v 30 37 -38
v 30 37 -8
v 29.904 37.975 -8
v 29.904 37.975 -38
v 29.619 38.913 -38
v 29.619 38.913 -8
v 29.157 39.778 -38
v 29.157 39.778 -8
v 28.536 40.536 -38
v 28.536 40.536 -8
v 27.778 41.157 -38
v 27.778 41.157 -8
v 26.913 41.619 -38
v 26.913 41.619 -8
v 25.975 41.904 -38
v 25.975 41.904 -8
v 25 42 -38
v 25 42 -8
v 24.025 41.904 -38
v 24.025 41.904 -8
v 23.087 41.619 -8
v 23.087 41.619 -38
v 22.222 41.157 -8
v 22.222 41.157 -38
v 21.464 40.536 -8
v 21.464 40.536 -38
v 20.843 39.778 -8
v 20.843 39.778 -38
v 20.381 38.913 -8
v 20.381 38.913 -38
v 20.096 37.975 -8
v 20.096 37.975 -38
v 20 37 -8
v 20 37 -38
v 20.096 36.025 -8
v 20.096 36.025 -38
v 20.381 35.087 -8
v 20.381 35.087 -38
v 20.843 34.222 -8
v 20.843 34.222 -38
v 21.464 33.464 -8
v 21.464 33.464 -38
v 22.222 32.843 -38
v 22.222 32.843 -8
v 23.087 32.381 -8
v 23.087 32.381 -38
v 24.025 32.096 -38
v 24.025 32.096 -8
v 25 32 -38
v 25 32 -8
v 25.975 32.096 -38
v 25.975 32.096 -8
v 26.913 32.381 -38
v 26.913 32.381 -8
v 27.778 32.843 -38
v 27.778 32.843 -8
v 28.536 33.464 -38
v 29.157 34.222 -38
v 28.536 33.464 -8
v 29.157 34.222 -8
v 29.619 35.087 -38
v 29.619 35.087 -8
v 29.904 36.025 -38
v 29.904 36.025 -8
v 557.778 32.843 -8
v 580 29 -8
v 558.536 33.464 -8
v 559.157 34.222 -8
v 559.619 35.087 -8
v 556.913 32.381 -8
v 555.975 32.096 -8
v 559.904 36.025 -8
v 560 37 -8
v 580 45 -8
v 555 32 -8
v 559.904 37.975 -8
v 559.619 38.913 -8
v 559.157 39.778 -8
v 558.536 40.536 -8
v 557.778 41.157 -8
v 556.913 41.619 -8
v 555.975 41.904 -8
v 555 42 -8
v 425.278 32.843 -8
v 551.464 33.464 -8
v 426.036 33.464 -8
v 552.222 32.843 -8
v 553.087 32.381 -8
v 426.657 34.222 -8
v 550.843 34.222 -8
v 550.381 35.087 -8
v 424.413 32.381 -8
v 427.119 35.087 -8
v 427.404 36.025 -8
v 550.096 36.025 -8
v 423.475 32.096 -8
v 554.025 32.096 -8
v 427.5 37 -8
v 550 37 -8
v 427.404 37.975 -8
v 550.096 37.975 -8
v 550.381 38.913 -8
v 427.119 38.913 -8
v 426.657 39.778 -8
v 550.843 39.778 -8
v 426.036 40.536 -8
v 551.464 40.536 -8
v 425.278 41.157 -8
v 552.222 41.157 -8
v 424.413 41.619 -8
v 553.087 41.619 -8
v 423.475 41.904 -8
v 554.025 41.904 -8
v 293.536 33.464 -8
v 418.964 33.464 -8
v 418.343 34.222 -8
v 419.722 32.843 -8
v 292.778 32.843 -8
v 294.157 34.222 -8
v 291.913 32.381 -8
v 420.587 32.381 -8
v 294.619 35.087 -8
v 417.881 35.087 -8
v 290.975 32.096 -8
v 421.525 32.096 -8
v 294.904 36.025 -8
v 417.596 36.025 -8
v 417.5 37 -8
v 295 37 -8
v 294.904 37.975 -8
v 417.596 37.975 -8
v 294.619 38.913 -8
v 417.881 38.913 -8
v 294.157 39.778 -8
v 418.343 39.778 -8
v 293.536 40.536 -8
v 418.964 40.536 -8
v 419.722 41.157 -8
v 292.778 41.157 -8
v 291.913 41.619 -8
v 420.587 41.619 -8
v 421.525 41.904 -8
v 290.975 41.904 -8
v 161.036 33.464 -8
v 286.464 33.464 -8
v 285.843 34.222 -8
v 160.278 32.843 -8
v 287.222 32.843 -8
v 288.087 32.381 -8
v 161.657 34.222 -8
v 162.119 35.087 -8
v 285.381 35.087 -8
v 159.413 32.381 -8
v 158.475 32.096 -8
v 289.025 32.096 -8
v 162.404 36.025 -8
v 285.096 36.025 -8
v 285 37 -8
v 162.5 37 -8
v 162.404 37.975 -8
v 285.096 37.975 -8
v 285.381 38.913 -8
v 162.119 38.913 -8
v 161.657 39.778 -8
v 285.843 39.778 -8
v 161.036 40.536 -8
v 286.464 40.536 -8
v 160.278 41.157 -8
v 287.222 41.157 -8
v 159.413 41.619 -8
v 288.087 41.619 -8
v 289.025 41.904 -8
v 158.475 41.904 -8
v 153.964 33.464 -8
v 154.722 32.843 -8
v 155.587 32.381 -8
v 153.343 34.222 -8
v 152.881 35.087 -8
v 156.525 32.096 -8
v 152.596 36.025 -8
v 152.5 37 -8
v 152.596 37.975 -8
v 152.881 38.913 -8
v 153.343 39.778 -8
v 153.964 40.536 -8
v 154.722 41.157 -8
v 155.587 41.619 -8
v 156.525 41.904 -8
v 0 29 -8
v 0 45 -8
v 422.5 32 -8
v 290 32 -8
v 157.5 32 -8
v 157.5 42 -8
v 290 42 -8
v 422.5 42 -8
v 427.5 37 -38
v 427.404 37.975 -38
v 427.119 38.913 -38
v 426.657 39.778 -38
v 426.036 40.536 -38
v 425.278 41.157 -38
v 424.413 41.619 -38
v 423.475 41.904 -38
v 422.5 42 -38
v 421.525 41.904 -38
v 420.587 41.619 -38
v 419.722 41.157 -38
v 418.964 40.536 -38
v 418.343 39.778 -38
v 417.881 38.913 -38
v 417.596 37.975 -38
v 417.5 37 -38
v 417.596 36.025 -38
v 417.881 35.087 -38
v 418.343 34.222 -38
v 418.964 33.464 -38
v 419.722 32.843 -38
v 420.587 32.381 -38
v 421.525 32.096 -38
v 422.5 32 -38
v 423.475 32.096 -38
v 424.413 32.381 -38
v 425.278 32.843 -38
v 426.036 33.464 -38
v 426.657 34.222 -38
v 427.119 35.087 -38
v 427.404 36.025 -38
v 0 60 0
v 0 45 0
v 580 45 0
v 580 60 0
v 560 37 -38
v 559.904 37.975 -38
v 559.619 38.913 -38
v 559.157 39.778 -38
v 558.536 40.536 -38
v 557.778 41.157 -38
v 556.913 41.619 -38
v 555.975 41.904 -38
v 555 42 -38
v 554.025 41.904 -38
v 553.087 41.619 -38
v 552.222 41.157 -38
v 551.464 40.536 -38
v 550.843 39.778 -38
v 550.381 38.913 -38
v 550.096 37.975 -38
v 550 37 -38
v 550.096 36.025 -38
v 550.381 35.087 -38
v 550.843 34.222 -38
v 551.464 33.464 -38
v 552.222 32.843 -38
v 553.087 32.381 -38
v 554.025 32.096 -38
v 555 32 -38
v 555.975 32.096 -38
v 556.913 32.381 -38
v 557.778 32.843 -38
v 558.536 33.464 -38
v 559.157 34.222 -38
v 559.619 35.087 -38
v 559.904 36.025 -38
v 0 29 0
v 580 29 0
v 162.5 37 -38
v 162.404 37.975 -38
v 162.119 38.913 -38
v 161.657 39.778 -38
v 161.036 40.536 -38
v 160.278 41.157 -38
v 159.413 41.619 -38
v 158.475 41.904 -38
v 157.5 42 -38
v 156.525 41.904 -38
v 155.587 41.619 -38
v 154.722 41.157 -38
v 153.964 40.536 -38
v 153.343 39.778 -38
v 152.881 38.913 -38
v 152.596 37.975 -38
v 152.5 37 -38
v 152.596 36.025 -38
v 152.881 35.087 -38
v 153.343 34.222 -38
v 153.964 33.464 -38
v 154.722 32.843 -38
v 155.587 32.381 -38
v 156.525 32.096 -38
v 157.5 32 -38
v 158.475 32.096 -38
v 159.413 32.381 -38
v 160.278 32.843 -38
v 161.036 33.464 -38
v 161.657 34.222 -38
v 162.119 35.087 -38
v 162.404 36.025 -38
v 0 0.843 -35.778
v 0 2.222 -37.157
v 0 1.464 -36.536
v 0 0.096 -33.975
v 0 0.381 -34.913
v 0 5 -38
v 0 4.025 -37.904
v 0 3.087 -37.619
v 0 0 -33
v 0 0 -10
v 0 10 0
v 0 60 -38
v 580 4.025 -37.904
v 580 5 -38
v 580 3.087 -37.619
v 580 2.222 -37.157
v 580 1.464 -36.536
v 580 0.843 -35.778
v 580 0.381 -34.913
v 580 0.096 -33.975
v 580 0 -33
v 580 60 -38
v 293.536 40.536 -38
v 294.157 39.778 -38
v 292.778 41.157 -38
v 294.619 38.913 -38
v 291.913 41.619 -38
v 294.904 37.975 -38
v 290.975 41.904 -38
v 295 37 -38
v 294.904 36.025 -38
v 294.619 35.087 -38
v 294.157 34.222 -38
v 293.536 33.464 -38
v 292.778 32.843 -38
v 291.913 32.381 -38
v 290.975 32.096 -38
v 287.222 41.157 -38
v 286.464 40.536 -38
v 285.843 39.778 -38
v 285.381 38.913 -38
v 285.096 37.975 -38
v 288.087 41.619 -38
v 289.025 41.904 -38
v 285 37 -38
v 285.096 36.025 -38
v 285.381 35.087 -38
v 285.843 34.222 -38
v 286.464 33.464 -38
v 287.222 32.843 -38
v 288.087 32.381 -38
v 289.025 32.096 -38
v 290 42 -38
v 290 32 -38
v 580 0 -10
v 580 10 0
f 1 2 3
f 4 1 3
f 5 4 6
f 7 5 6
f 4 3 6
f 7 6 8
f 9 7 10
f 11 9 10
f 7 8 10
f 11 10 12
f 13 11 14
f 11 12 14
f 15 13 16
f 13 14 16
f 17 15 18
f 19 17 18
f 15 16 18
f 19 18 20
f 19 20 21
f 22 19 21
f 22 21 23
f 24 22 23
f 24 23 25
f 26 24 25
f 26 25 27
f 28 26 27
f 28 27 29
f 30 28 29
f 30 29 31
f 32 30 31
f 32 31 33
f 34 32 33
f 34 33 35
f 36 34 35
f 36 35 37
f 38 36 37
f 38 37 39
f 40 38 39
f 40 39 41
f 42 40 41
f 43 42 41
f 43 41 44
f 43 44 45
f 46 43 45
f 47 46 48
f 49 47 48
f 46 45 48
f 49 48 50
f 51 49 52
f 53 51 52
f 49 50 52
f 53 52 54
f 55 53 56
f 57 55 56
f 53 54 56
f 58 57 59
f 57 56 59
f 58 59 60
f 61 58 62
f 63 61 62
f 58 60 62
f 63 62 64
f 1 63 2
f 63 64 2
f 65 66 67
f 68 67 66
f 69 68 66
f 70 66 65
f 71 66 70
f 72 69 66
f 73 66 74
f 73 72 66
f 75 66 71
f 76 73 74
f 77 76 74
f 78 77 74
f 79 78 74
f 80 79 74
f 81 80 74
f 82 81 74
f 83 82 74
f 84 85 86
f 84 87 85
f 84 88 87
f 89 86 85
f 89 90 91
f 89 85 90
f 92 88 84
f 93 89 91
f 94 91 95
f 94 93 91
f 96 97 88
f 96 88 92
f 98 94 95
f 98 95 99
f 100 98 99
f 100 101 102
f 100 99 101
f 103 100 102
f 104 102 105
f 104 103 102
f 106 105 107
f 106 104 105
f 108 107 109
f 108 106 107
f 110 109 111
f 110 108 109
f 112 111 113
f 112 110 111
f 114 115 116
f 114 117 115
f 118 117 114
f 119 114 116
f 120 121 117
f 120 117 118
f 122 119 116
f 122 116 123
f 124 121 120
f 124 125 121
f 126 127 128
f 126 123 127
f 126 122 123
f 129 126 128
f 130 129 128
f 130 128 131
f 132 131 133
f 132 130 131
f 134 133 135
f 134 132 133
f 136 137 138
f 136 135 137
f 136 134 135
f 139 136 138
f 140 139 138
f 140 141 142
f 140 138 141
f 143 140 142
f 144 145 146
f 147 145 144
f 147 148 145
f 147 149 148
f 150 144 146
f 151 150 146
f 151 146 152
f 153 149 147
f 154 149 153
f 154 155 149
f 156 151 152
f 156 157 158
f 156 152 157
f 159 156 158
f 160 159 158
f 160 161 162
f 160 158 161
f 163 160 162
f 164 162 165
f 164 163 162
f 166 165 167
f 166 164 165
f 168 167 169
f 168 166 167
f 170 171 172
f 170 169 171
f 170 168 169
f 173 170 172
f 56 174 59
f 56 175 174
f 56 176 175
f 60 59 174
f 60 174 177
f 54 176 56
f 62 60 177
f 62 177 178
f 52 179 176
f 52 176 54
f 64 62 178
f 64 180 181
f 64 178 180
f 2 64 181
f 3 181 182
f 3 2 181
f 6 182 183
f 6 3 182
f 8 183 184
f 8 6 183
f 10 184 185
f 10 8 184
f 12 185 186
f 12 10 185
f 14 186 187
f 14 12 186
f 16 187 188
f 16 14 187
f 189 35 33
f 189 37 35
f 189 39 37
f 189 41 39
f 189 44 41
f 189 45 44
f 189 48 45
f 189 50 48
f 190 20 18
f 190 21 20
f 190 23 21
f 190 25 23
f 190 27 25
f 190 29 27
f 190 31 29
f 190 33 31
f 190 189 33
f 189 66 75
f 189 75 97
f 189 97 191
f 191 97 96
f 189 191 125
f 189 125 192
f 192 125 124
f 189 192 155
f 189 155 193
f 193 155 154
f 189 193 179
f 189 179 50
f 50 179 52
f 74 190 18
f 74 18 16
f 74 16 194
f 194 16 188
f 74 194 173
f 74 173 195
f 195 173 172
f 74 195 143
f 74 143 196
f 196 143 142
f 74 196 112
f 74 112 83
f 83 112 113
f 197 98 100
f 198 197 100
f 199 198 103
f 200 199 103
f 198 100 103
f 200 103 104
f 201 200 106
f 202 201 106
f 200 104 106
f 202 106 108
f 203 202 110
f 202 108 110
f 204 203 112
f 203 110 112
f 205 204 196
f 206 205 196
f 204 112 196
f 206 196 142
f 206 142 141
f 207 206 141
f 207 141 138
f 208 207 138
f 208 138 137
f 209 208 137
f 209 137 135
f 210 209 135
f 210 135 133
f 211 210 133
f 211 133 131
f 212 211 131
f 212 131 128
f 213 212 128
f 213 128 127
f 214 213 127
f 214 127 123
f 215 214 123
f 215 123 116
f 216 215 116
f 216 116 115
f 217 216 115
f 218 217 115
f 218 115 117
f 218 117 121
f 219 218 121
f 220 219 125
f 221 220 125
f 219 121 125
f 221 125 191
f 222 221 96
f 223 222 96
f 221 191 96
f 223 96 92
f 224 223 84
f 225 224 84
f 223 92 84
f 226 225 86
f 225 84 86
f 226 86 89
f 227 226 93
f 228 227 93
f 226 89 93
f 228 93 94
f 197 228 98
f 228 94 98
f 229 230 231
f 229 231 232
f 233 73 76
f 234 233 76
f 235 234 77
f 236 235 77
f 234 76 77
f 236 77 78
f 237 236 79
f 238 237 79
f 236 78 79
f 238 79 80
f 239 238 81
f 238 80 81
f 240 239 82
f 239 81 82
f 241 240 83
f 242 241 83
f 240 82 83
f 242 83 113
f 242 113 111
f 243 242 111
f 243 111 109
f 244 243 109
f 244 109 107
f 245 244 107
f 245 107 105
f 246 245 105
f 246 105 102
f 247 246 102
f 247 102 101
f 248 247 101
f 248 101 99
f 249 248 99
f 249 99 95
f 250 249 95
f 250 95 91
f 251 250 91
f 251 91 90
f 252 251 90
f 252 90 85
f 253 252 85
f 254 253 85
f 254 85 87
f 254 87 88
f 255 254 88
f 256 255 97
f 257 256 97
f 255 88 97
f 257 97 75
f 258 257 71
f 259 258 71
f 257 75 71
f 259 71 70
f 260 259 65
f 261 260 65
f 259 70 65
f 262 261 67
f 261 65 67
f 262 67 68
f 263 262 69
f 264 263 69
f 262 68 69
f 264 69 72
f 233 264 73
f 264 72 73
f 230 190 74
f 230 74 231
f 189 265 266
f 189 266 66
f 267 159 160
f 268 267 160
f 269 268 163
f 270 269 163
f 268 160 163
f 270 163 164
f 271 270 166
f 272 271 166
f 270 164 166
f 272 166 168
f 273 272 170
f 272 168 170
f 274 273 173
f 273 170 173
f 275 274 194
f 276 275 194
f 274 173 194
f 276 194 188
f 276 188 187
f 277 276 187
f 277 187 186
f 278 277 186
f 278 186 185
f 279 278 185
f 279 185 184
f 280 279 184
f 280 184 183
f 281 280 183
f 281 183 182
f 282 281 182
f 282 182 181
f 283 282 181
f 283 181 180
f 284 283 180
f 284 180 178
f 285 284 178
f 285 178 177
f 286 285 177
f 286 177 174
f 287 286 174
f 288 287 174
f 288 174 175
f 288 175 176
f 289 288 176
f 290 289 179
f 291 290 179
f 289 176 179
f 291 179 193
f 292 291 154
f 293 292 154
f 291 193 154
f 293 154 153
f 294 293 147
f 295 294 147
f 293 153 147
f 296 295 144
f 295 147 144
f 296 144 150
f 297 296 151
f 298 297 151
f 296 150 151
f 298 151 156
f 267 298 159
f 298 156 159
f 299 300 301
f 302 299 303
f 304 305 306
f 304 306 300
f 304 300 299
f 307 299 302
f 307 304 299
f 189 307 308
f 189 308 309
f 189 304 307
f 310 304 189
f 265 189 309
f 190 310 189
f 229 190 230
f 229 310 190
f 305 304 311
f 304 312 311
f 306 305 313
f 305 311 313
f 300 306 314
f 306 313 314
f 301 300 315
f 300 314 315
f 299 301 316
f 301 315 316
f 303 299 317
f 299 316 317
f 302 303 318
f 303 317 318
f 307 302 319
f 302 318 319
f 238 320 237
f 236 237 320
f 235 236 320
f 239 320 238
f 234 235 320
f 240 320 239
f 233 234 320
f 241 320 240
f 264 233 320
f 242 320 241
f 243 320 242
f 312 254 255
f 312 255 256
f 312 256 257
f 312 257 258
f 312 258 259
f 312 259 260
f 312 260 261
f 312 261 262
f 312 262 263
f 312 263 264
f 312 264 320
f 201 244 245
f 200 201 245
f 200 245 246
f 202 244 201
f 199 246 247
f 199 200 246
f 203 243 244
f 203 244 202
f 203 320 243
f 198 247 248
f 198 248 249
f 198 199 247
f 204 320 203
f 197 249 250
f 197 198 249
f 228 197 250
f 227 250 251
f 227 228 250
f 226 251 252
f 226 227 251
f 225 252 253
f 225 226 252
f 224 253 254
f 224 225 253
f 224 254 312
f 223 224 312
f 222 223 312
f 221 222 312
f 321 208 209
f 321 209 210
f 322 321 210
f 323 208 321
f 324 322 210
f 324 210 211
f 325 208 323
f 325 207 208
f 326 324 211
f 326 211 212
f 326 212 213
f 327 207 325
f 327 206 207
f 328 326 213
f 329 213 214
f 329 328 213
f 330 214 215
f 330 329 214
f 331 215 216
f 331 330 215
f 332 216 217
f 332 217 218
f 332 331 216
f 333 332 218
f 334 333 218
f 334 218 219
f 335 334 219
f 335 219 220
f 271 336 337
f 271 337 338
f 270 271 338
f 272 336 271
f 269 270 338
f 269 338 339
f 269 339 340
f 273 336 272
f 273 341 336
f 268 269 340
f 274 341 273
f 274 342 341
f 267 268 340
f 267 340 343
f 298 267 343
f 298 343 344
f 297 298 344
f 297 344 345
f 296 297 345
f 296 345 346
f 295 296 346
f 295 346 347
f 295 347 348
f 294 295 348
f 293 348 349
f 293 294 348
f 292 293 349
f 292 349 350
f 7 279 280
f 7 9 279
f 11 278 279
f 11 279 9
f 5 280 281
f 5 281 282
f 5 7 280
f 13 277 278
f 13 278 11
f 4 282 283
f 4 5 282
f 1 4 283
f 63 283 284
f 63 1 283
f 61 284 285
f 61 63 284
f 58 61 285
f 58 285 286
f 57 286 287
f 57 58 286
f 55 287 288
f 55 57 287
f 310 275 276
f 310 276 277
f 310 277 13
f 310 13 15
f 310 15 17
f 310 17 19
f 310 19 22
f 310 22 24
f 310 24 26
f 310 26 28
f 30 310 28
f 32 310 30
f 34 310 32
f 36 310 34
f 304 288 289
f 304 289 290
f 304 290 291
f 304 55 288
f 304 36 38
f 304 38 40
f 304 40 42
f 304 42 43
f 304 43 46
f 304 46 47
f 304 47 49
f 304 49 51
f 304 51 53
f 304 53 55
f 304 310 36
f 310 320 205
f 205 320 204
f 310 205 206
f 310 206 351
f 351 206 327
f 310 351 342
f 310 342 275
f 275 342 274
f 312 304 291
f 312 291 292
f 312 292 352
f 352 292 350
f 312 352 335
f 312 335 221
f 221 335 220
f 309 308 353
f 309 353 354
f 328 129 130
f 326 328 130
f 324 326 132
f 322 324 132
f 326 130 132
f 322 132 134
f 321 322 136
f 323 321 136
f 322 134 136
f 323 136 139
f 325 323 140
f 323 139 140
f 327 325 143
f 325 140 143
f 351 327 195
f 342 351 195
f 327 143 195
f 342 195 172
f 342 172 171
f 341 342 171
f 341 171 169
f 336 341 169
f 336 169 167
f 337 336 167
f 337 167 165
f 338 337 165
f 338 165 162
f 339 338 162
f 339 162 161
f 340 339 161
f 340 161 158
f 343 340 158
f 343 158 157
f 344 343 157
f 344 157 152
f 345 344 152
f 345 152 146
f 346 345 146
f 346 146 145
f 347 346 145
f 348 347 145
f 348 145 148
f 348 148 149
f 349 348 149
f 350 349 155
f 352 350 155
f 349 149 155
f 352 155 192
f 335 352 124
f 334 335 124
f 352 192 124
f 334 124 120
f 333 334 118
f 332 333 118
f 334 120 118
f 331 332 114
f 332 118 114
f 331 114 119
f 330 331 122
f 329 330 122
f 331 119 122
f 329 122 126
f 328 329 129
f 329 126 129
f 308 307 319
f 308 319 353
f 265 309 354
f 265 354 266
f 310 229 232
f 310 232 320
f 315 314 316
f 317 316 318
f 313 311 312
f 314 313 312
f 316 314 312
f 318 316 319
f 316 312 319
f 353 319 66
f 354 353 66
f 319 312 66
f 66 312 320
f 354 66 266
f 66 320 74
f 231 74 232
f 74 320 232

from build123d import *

# Parameters (mm, degrees)
SALIENTE_EXTRUIR1_DEPTH = 580
REDONDEO1_R             = 5
CORTAR_EXTRUIR1_REACH   = 585.866
CROQUIS2_R              = 5


with BuildPart() as part:
    # Croquis1 → Saliente-Extruir1 (new body)
    with BuildSketch(Plane(origin=(0, 0, 0), x_dir=(0, 0, -1), z_dir=(1, 0, 0))):
        Polygon((10, 0), (0, 10), (0, 29), (8, 29), (8, 45), (0, 45), (0, 60), (38, 60), (38, 0), align=None)
    extrude(amount=SALIENTE_EXTRUIR1_DEPTH)

    # Redondeo1
    redondeo1_edges = [part.edges().sort_by_distance(p)[0] for p in [
        (290, 0, -38),
    ]]
    fillet(redondeo1_edges, radius=REDONDEO1_R)

    # Croquis2 → Cortar-Extruir1 (cut, up to next)
    with BuildSketch(Plane.XY.offset(-8), mode=Mode.PRIVATE) as cortar_extruir1_sk1:
        with Locations((25, 37)):
            Circle(CROQUIS2_R)
    cortar_extruir1_tool1 = extrude(cortar_extruir1_sk1.sketch, amount=-CORTAR_EXTRUIR1_REACH, mode=Mode.PRIVATE) & part.part
    # Croquis2 → Cortar-Extruir1 (cut, up to next)
    with BuildSketch(Plane.XY.offset(-8), mode=Mode.PRIVATE) as cortar_extruir1_sk2:
        with Locations((157.5, 37)):
            Circle(CROQUIS2_R)
    cortar_extruir1_tool2 = extrude(cortar_extruir1_sk2.sketch, amount=-CORTAR_EXTRUIR1_REACH, mode=Mode.PRIVATE) & part.part
    # Croquis2 → Cortar-Extruir1 (cut, up to next)
    with BuildSketch(Plane.XY.offset(-8), mode=Mode.PRIVATE) as cortar_extruir1_sk3:
        with Locations((555, 37)):
            Circle(CROQUIS2_R)
    cortar_extruir1_tool3 = extrude(cortar_extruir1_sk3.sketch, amount=-CORTAR_EXTRUIR1_REACH, mode=Mode.PRIVATE) & part.part
    # Croquis2 → Cortar-Extruir1 (cut, up to next)
    with BuildSketch(Plane.XY.offset(-8), mode=Mode.PRIVATE) as cortar_extruir1_sk4:
        with Locations((290, 37)):
            Circle(CROQUIS2_R)
    cortar_extruir1_tool4 = extrude(cortar_extruir1_sk4.sketch, amount=-CORTAR_EXTRUIR1_REACH, mode=Mode.PRIVATE) & part.part
    # Croquis2 → Cortar-Extruir1 (cut, up to next)
    with BuildSketch(Plane.XY.offset(-8), mode=Mode.PRIVATE) as cortar_extruir1_sk5:
        with Locations((422.5, 37)):
            Circle(CROQUIS2_R)
    cortar_extruir1_tool5 = extrude(cortar_extruir1_sk5.sketch, amount=-CORTAR_EXTRUIR1_REACH, mode=Mode.PRIVATE) & part.part
    add(cortar_extruir1_tool1.solids().sort_by_distance((25, 37, -8))[0], mode=Mode.SUBTRACT)
    add(cortar_extruir1_tool2.solids().sort_by_distance((157.5, 37, -8))[0], mode=Mode.SUBTRACT)
    add(cortar_extruir1_tool3.solids().sort_by_distance((555, 37, -8))[0], mode=Mode.SUBTRACT)
    add(cortar_extruir1_tool4.solids().sort_by_distance((290, 37, -8))[0], mode=Mode.SUBTRACT)
    add(cortar_extruir1_tool5.solids().sort_by_distance((422.5, 37, -8))[0], mode=Mode.SUBTRACT)


solid = part.part
